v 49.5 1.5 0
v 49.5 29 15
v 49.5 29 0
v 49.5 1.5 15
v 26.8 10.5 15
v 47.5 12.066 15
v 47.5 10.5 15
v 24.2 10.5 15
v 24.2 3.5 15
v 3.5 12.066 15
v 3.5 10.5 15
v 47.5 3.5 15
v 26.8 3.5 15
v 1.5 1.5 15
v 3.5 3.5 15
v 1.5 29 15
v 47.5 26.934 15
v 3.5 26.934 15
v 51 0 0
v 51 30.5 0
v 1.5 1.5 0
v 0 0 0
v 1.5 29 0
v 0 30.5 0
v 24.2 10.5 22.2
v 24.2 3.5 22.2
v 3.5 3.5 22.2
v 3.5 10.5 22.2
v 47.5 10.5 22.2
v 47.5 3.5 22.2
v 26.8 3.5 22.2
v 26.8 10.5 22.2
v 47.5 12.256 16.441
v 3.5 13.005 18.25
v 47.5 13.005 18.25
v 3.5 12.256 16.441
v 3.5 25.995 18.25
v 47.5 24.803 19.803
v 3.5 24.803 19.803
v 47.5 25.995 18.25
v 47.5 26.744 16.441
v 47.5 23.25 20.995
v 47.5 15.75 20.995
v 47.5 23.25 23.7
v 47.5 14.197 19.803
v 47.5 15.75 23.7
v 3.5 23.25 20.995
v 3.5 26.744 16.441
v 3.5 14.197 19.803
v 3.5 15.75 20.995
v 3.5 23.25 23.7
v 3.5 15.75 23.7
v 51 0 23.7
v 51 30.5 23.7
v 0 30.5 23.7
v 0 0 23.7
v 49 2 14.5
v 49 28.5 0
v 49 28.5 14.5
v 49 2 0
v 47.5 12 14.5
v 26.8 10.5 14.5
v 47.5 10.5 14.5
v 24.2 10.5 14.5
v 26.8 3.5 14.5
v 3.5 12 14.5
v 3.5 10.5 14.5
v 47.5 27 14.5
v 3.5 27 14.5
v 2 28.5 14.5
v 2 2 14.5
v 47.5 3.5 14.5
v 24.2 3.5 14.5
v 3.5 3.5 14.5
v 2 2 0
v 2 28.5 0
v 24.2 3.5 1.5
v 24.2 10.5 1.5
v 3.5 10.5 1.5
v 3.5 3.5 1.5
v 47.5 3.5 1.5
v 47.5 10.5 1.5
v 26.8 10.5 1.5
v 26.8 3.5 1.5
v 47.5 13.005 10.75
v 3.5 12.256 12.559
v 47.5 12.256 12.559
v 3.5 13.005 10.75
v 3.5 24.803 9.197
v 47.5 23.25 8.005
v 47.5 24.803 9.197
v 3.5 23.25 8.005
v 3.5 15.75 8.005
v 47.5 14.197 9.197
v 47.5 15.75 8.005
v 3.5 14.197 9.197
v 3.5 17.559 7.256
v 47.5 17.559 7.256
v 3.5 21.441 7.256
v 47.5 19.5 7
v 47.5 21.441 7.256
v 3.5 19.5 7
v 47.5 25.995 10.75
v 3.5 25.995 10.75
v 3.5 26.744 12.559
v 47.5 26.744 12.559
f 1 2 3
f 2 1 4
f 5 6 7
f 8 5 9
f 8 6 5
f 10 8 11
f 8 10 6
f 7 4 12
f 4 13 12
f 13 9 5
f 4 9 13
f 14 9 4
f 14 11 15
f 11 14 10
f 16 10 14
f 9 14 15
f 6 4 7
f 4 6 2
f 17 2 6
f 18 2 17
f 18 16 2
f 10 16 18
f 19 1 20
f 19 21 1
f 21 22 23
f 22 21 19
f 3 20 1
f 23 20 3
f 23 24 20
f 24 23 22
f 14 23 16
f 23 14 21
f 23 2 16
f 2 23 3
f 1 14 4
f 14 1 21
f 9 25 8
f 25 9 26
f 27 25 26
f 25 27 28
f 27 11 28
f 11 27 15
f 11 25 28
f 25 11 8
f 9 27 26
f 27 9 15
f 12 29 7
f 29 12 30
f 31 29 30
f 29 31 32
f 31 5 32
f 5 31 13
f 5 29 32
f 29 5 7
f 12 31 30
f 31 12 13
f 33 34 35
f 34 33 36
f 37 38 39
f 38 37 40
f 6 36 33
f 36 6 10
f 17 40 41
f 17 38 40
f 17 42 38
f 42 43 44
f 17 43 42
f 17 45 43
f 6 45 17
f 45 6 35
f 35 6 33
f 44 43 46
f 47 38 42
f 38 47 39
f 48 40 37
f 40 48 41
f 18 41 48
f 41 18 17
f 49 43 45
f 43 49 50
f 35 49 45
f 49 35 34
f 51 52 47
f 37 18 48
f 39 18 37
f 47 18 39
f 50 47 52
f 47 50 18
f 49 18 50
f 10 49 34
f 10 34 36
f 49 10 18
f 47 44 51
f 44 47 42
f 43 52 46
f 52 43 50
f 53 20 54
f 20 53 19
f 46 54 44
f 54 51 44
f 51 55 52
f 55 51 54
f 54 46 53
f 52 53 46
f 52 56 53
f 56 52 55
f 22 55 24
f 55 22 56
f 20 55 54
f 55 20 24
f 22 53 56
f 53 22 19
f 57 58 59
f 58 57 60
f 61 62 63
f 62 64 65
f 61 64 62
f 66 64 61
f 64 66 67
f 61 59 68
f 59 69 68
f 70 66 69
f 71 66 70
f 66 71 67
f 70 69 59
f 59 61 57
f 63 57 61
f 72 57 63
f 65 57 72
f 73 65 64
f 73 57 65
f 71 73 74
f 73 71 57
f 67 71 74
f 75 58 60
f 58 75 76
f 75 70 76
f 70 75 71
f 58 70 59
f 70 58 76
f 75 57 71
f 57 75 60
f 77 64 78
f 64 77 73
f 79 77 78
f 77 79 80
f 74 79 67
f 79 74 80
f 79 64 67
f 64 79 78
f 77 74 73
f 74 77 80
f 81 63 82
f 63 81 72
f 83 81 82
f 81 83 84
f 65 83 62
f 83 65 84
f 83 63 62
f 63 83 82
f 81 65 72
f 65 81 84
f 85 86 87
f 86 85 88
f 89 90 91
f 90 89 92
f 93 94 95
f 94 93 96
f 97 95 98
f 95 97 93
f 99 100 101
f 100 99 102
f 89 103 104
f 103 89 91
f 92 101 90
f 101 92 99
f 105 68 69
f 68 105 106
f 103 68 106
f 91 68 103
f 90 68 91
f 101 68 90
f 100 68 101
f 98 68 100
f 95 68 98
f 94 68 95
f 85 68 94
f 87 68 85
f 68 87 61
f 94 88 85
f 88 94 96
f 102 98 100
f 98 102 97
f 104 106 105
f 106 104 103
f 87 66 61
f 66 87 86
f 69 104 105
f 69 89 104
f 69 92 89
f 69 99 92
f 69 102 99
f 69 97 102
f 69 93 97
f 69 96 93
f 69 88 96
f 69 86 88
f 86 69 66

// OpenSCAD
// I recommend viewing as wireframe if you want to work on this 
// (F11 or View -> Wireframe).
//
// I manually create two STL files from this file.
// 
// This is a box for presence tokens and spirit reminder tokens, 
// designed to be used with or without a lid.
// At the end of this file you will find lines which can either 
// render the box, the lid, or both (including proper spacing).
//
// The original idea for this box is from the CC BY 4.0-licensed
// Anemic's Spirit Island + BC + JE Organizer 
//    https://www.thingiverse.com/thing:4269765
// 
// However, they have all tokens in one tray, individual slots per 
// reminder token, more space in between all slots etc., no lid, 
// but the general layout per individual spirit was a huge inspiration,
// i.e., having a cylinder for the presence and slots for the reminders 
// next to it.

// general settings
wall = 1.5;
separator = wall;

// presence tokens: 44 mm height with 7.5 mm radius
presence_radius = 7.5;
presence_stacked = 44;  // this is too much, but new spirits have one token more etc.

// reminder tokens: 7 mm height (stack of 3, estimate), 20x13 oval
reminder_stacked = 7;
reminder_width = 13;
reminder_height = 20.7;  // adds ~0.7 mm slack

// Lid properties
opening_width = presence_radius;
spacing_lid = .5;

// box outer dimensions
box_width = presence_stacked + 2 * wall;
box_depth = 2 * wall + separator + 2 * presence_radius + reminder_stacked;
box_height = reminder_width + wall;

module Box() {

difference()
{
    // height tokens + wall, walls + separator + 15 mm presence width + 7.5 mm reminder tokens
    cube([box_width, box_depth, box_height]);
    
    translate([wall, wall, wall]) 
        cube([reminder_height, reminder_stacked, reminder_width]);
    
    translate([presence_stacked + wall - reminder_height, wall, wall]) 
        cube([reminder_height, reminder_stacked, reminder_width]);
    
    translate([wall, wall + separator + reminder_stacked + presence_radius, reminder_width + wall])
        rotate([0, 90, 0]) 
            cylinder(presence_stacked, r=presence_radius);
};

} // end Box

module Lid() {

difference()
{
    cube([box_width + 2 * spacing_lid + 2 * wall, 
          box_depth + 2 * spacing_lid + 2 * wall, 
          box_height + wall + reminder_height - reminder_width]);
    
    translate([wall, wall, 0])
    {
        cube([box_width + 2 * spacing_lid, 
              box_depth + 2 * spacing_lid, 
              box_height + spacing_lid]);
        
        // reminder tokens 1
        translate([spacing_lid + wall, 
                   spacing_lid + wall, 
                   box_height]) 
            cube([reminder_height, reminder_stacked, reminder_height - reminder_width]);
        
        // reminder tokens 2
        translate([spacing_lid + wall + presence_stacked - reminder_height, 
                   spacing_lid + wall, 
                   box_height]) 
            cube([reminder_height, reminder_stacked, reminder_height - reminder_width]);
    
        // presence tokens
        translate([spacing_lid + wall, 
                   spacing_lid + wall + separator + reminder_stacked + presence_radius,
                   reminder_width + wall])
            rotate([0, 90, 0]) 
                cylinder(presence_stacked, r=presence_radius);
         
         // opening to see colors from outside
         translate([spacing_lid + wall,
                   spacing_lid + wall + separator + reminder_stacked + presence_radius - opening_width / 2,
                   reminder_width + wall])
             cube([presence_stacked, 
                   opening_width, 
                   2 * wall + spacing_lid + presence_radius]);
    }
}

} // end Lid

//Box();
Lid();
translate([spacing_lid + wall, spacing_lid + wall, 0]) Box();
